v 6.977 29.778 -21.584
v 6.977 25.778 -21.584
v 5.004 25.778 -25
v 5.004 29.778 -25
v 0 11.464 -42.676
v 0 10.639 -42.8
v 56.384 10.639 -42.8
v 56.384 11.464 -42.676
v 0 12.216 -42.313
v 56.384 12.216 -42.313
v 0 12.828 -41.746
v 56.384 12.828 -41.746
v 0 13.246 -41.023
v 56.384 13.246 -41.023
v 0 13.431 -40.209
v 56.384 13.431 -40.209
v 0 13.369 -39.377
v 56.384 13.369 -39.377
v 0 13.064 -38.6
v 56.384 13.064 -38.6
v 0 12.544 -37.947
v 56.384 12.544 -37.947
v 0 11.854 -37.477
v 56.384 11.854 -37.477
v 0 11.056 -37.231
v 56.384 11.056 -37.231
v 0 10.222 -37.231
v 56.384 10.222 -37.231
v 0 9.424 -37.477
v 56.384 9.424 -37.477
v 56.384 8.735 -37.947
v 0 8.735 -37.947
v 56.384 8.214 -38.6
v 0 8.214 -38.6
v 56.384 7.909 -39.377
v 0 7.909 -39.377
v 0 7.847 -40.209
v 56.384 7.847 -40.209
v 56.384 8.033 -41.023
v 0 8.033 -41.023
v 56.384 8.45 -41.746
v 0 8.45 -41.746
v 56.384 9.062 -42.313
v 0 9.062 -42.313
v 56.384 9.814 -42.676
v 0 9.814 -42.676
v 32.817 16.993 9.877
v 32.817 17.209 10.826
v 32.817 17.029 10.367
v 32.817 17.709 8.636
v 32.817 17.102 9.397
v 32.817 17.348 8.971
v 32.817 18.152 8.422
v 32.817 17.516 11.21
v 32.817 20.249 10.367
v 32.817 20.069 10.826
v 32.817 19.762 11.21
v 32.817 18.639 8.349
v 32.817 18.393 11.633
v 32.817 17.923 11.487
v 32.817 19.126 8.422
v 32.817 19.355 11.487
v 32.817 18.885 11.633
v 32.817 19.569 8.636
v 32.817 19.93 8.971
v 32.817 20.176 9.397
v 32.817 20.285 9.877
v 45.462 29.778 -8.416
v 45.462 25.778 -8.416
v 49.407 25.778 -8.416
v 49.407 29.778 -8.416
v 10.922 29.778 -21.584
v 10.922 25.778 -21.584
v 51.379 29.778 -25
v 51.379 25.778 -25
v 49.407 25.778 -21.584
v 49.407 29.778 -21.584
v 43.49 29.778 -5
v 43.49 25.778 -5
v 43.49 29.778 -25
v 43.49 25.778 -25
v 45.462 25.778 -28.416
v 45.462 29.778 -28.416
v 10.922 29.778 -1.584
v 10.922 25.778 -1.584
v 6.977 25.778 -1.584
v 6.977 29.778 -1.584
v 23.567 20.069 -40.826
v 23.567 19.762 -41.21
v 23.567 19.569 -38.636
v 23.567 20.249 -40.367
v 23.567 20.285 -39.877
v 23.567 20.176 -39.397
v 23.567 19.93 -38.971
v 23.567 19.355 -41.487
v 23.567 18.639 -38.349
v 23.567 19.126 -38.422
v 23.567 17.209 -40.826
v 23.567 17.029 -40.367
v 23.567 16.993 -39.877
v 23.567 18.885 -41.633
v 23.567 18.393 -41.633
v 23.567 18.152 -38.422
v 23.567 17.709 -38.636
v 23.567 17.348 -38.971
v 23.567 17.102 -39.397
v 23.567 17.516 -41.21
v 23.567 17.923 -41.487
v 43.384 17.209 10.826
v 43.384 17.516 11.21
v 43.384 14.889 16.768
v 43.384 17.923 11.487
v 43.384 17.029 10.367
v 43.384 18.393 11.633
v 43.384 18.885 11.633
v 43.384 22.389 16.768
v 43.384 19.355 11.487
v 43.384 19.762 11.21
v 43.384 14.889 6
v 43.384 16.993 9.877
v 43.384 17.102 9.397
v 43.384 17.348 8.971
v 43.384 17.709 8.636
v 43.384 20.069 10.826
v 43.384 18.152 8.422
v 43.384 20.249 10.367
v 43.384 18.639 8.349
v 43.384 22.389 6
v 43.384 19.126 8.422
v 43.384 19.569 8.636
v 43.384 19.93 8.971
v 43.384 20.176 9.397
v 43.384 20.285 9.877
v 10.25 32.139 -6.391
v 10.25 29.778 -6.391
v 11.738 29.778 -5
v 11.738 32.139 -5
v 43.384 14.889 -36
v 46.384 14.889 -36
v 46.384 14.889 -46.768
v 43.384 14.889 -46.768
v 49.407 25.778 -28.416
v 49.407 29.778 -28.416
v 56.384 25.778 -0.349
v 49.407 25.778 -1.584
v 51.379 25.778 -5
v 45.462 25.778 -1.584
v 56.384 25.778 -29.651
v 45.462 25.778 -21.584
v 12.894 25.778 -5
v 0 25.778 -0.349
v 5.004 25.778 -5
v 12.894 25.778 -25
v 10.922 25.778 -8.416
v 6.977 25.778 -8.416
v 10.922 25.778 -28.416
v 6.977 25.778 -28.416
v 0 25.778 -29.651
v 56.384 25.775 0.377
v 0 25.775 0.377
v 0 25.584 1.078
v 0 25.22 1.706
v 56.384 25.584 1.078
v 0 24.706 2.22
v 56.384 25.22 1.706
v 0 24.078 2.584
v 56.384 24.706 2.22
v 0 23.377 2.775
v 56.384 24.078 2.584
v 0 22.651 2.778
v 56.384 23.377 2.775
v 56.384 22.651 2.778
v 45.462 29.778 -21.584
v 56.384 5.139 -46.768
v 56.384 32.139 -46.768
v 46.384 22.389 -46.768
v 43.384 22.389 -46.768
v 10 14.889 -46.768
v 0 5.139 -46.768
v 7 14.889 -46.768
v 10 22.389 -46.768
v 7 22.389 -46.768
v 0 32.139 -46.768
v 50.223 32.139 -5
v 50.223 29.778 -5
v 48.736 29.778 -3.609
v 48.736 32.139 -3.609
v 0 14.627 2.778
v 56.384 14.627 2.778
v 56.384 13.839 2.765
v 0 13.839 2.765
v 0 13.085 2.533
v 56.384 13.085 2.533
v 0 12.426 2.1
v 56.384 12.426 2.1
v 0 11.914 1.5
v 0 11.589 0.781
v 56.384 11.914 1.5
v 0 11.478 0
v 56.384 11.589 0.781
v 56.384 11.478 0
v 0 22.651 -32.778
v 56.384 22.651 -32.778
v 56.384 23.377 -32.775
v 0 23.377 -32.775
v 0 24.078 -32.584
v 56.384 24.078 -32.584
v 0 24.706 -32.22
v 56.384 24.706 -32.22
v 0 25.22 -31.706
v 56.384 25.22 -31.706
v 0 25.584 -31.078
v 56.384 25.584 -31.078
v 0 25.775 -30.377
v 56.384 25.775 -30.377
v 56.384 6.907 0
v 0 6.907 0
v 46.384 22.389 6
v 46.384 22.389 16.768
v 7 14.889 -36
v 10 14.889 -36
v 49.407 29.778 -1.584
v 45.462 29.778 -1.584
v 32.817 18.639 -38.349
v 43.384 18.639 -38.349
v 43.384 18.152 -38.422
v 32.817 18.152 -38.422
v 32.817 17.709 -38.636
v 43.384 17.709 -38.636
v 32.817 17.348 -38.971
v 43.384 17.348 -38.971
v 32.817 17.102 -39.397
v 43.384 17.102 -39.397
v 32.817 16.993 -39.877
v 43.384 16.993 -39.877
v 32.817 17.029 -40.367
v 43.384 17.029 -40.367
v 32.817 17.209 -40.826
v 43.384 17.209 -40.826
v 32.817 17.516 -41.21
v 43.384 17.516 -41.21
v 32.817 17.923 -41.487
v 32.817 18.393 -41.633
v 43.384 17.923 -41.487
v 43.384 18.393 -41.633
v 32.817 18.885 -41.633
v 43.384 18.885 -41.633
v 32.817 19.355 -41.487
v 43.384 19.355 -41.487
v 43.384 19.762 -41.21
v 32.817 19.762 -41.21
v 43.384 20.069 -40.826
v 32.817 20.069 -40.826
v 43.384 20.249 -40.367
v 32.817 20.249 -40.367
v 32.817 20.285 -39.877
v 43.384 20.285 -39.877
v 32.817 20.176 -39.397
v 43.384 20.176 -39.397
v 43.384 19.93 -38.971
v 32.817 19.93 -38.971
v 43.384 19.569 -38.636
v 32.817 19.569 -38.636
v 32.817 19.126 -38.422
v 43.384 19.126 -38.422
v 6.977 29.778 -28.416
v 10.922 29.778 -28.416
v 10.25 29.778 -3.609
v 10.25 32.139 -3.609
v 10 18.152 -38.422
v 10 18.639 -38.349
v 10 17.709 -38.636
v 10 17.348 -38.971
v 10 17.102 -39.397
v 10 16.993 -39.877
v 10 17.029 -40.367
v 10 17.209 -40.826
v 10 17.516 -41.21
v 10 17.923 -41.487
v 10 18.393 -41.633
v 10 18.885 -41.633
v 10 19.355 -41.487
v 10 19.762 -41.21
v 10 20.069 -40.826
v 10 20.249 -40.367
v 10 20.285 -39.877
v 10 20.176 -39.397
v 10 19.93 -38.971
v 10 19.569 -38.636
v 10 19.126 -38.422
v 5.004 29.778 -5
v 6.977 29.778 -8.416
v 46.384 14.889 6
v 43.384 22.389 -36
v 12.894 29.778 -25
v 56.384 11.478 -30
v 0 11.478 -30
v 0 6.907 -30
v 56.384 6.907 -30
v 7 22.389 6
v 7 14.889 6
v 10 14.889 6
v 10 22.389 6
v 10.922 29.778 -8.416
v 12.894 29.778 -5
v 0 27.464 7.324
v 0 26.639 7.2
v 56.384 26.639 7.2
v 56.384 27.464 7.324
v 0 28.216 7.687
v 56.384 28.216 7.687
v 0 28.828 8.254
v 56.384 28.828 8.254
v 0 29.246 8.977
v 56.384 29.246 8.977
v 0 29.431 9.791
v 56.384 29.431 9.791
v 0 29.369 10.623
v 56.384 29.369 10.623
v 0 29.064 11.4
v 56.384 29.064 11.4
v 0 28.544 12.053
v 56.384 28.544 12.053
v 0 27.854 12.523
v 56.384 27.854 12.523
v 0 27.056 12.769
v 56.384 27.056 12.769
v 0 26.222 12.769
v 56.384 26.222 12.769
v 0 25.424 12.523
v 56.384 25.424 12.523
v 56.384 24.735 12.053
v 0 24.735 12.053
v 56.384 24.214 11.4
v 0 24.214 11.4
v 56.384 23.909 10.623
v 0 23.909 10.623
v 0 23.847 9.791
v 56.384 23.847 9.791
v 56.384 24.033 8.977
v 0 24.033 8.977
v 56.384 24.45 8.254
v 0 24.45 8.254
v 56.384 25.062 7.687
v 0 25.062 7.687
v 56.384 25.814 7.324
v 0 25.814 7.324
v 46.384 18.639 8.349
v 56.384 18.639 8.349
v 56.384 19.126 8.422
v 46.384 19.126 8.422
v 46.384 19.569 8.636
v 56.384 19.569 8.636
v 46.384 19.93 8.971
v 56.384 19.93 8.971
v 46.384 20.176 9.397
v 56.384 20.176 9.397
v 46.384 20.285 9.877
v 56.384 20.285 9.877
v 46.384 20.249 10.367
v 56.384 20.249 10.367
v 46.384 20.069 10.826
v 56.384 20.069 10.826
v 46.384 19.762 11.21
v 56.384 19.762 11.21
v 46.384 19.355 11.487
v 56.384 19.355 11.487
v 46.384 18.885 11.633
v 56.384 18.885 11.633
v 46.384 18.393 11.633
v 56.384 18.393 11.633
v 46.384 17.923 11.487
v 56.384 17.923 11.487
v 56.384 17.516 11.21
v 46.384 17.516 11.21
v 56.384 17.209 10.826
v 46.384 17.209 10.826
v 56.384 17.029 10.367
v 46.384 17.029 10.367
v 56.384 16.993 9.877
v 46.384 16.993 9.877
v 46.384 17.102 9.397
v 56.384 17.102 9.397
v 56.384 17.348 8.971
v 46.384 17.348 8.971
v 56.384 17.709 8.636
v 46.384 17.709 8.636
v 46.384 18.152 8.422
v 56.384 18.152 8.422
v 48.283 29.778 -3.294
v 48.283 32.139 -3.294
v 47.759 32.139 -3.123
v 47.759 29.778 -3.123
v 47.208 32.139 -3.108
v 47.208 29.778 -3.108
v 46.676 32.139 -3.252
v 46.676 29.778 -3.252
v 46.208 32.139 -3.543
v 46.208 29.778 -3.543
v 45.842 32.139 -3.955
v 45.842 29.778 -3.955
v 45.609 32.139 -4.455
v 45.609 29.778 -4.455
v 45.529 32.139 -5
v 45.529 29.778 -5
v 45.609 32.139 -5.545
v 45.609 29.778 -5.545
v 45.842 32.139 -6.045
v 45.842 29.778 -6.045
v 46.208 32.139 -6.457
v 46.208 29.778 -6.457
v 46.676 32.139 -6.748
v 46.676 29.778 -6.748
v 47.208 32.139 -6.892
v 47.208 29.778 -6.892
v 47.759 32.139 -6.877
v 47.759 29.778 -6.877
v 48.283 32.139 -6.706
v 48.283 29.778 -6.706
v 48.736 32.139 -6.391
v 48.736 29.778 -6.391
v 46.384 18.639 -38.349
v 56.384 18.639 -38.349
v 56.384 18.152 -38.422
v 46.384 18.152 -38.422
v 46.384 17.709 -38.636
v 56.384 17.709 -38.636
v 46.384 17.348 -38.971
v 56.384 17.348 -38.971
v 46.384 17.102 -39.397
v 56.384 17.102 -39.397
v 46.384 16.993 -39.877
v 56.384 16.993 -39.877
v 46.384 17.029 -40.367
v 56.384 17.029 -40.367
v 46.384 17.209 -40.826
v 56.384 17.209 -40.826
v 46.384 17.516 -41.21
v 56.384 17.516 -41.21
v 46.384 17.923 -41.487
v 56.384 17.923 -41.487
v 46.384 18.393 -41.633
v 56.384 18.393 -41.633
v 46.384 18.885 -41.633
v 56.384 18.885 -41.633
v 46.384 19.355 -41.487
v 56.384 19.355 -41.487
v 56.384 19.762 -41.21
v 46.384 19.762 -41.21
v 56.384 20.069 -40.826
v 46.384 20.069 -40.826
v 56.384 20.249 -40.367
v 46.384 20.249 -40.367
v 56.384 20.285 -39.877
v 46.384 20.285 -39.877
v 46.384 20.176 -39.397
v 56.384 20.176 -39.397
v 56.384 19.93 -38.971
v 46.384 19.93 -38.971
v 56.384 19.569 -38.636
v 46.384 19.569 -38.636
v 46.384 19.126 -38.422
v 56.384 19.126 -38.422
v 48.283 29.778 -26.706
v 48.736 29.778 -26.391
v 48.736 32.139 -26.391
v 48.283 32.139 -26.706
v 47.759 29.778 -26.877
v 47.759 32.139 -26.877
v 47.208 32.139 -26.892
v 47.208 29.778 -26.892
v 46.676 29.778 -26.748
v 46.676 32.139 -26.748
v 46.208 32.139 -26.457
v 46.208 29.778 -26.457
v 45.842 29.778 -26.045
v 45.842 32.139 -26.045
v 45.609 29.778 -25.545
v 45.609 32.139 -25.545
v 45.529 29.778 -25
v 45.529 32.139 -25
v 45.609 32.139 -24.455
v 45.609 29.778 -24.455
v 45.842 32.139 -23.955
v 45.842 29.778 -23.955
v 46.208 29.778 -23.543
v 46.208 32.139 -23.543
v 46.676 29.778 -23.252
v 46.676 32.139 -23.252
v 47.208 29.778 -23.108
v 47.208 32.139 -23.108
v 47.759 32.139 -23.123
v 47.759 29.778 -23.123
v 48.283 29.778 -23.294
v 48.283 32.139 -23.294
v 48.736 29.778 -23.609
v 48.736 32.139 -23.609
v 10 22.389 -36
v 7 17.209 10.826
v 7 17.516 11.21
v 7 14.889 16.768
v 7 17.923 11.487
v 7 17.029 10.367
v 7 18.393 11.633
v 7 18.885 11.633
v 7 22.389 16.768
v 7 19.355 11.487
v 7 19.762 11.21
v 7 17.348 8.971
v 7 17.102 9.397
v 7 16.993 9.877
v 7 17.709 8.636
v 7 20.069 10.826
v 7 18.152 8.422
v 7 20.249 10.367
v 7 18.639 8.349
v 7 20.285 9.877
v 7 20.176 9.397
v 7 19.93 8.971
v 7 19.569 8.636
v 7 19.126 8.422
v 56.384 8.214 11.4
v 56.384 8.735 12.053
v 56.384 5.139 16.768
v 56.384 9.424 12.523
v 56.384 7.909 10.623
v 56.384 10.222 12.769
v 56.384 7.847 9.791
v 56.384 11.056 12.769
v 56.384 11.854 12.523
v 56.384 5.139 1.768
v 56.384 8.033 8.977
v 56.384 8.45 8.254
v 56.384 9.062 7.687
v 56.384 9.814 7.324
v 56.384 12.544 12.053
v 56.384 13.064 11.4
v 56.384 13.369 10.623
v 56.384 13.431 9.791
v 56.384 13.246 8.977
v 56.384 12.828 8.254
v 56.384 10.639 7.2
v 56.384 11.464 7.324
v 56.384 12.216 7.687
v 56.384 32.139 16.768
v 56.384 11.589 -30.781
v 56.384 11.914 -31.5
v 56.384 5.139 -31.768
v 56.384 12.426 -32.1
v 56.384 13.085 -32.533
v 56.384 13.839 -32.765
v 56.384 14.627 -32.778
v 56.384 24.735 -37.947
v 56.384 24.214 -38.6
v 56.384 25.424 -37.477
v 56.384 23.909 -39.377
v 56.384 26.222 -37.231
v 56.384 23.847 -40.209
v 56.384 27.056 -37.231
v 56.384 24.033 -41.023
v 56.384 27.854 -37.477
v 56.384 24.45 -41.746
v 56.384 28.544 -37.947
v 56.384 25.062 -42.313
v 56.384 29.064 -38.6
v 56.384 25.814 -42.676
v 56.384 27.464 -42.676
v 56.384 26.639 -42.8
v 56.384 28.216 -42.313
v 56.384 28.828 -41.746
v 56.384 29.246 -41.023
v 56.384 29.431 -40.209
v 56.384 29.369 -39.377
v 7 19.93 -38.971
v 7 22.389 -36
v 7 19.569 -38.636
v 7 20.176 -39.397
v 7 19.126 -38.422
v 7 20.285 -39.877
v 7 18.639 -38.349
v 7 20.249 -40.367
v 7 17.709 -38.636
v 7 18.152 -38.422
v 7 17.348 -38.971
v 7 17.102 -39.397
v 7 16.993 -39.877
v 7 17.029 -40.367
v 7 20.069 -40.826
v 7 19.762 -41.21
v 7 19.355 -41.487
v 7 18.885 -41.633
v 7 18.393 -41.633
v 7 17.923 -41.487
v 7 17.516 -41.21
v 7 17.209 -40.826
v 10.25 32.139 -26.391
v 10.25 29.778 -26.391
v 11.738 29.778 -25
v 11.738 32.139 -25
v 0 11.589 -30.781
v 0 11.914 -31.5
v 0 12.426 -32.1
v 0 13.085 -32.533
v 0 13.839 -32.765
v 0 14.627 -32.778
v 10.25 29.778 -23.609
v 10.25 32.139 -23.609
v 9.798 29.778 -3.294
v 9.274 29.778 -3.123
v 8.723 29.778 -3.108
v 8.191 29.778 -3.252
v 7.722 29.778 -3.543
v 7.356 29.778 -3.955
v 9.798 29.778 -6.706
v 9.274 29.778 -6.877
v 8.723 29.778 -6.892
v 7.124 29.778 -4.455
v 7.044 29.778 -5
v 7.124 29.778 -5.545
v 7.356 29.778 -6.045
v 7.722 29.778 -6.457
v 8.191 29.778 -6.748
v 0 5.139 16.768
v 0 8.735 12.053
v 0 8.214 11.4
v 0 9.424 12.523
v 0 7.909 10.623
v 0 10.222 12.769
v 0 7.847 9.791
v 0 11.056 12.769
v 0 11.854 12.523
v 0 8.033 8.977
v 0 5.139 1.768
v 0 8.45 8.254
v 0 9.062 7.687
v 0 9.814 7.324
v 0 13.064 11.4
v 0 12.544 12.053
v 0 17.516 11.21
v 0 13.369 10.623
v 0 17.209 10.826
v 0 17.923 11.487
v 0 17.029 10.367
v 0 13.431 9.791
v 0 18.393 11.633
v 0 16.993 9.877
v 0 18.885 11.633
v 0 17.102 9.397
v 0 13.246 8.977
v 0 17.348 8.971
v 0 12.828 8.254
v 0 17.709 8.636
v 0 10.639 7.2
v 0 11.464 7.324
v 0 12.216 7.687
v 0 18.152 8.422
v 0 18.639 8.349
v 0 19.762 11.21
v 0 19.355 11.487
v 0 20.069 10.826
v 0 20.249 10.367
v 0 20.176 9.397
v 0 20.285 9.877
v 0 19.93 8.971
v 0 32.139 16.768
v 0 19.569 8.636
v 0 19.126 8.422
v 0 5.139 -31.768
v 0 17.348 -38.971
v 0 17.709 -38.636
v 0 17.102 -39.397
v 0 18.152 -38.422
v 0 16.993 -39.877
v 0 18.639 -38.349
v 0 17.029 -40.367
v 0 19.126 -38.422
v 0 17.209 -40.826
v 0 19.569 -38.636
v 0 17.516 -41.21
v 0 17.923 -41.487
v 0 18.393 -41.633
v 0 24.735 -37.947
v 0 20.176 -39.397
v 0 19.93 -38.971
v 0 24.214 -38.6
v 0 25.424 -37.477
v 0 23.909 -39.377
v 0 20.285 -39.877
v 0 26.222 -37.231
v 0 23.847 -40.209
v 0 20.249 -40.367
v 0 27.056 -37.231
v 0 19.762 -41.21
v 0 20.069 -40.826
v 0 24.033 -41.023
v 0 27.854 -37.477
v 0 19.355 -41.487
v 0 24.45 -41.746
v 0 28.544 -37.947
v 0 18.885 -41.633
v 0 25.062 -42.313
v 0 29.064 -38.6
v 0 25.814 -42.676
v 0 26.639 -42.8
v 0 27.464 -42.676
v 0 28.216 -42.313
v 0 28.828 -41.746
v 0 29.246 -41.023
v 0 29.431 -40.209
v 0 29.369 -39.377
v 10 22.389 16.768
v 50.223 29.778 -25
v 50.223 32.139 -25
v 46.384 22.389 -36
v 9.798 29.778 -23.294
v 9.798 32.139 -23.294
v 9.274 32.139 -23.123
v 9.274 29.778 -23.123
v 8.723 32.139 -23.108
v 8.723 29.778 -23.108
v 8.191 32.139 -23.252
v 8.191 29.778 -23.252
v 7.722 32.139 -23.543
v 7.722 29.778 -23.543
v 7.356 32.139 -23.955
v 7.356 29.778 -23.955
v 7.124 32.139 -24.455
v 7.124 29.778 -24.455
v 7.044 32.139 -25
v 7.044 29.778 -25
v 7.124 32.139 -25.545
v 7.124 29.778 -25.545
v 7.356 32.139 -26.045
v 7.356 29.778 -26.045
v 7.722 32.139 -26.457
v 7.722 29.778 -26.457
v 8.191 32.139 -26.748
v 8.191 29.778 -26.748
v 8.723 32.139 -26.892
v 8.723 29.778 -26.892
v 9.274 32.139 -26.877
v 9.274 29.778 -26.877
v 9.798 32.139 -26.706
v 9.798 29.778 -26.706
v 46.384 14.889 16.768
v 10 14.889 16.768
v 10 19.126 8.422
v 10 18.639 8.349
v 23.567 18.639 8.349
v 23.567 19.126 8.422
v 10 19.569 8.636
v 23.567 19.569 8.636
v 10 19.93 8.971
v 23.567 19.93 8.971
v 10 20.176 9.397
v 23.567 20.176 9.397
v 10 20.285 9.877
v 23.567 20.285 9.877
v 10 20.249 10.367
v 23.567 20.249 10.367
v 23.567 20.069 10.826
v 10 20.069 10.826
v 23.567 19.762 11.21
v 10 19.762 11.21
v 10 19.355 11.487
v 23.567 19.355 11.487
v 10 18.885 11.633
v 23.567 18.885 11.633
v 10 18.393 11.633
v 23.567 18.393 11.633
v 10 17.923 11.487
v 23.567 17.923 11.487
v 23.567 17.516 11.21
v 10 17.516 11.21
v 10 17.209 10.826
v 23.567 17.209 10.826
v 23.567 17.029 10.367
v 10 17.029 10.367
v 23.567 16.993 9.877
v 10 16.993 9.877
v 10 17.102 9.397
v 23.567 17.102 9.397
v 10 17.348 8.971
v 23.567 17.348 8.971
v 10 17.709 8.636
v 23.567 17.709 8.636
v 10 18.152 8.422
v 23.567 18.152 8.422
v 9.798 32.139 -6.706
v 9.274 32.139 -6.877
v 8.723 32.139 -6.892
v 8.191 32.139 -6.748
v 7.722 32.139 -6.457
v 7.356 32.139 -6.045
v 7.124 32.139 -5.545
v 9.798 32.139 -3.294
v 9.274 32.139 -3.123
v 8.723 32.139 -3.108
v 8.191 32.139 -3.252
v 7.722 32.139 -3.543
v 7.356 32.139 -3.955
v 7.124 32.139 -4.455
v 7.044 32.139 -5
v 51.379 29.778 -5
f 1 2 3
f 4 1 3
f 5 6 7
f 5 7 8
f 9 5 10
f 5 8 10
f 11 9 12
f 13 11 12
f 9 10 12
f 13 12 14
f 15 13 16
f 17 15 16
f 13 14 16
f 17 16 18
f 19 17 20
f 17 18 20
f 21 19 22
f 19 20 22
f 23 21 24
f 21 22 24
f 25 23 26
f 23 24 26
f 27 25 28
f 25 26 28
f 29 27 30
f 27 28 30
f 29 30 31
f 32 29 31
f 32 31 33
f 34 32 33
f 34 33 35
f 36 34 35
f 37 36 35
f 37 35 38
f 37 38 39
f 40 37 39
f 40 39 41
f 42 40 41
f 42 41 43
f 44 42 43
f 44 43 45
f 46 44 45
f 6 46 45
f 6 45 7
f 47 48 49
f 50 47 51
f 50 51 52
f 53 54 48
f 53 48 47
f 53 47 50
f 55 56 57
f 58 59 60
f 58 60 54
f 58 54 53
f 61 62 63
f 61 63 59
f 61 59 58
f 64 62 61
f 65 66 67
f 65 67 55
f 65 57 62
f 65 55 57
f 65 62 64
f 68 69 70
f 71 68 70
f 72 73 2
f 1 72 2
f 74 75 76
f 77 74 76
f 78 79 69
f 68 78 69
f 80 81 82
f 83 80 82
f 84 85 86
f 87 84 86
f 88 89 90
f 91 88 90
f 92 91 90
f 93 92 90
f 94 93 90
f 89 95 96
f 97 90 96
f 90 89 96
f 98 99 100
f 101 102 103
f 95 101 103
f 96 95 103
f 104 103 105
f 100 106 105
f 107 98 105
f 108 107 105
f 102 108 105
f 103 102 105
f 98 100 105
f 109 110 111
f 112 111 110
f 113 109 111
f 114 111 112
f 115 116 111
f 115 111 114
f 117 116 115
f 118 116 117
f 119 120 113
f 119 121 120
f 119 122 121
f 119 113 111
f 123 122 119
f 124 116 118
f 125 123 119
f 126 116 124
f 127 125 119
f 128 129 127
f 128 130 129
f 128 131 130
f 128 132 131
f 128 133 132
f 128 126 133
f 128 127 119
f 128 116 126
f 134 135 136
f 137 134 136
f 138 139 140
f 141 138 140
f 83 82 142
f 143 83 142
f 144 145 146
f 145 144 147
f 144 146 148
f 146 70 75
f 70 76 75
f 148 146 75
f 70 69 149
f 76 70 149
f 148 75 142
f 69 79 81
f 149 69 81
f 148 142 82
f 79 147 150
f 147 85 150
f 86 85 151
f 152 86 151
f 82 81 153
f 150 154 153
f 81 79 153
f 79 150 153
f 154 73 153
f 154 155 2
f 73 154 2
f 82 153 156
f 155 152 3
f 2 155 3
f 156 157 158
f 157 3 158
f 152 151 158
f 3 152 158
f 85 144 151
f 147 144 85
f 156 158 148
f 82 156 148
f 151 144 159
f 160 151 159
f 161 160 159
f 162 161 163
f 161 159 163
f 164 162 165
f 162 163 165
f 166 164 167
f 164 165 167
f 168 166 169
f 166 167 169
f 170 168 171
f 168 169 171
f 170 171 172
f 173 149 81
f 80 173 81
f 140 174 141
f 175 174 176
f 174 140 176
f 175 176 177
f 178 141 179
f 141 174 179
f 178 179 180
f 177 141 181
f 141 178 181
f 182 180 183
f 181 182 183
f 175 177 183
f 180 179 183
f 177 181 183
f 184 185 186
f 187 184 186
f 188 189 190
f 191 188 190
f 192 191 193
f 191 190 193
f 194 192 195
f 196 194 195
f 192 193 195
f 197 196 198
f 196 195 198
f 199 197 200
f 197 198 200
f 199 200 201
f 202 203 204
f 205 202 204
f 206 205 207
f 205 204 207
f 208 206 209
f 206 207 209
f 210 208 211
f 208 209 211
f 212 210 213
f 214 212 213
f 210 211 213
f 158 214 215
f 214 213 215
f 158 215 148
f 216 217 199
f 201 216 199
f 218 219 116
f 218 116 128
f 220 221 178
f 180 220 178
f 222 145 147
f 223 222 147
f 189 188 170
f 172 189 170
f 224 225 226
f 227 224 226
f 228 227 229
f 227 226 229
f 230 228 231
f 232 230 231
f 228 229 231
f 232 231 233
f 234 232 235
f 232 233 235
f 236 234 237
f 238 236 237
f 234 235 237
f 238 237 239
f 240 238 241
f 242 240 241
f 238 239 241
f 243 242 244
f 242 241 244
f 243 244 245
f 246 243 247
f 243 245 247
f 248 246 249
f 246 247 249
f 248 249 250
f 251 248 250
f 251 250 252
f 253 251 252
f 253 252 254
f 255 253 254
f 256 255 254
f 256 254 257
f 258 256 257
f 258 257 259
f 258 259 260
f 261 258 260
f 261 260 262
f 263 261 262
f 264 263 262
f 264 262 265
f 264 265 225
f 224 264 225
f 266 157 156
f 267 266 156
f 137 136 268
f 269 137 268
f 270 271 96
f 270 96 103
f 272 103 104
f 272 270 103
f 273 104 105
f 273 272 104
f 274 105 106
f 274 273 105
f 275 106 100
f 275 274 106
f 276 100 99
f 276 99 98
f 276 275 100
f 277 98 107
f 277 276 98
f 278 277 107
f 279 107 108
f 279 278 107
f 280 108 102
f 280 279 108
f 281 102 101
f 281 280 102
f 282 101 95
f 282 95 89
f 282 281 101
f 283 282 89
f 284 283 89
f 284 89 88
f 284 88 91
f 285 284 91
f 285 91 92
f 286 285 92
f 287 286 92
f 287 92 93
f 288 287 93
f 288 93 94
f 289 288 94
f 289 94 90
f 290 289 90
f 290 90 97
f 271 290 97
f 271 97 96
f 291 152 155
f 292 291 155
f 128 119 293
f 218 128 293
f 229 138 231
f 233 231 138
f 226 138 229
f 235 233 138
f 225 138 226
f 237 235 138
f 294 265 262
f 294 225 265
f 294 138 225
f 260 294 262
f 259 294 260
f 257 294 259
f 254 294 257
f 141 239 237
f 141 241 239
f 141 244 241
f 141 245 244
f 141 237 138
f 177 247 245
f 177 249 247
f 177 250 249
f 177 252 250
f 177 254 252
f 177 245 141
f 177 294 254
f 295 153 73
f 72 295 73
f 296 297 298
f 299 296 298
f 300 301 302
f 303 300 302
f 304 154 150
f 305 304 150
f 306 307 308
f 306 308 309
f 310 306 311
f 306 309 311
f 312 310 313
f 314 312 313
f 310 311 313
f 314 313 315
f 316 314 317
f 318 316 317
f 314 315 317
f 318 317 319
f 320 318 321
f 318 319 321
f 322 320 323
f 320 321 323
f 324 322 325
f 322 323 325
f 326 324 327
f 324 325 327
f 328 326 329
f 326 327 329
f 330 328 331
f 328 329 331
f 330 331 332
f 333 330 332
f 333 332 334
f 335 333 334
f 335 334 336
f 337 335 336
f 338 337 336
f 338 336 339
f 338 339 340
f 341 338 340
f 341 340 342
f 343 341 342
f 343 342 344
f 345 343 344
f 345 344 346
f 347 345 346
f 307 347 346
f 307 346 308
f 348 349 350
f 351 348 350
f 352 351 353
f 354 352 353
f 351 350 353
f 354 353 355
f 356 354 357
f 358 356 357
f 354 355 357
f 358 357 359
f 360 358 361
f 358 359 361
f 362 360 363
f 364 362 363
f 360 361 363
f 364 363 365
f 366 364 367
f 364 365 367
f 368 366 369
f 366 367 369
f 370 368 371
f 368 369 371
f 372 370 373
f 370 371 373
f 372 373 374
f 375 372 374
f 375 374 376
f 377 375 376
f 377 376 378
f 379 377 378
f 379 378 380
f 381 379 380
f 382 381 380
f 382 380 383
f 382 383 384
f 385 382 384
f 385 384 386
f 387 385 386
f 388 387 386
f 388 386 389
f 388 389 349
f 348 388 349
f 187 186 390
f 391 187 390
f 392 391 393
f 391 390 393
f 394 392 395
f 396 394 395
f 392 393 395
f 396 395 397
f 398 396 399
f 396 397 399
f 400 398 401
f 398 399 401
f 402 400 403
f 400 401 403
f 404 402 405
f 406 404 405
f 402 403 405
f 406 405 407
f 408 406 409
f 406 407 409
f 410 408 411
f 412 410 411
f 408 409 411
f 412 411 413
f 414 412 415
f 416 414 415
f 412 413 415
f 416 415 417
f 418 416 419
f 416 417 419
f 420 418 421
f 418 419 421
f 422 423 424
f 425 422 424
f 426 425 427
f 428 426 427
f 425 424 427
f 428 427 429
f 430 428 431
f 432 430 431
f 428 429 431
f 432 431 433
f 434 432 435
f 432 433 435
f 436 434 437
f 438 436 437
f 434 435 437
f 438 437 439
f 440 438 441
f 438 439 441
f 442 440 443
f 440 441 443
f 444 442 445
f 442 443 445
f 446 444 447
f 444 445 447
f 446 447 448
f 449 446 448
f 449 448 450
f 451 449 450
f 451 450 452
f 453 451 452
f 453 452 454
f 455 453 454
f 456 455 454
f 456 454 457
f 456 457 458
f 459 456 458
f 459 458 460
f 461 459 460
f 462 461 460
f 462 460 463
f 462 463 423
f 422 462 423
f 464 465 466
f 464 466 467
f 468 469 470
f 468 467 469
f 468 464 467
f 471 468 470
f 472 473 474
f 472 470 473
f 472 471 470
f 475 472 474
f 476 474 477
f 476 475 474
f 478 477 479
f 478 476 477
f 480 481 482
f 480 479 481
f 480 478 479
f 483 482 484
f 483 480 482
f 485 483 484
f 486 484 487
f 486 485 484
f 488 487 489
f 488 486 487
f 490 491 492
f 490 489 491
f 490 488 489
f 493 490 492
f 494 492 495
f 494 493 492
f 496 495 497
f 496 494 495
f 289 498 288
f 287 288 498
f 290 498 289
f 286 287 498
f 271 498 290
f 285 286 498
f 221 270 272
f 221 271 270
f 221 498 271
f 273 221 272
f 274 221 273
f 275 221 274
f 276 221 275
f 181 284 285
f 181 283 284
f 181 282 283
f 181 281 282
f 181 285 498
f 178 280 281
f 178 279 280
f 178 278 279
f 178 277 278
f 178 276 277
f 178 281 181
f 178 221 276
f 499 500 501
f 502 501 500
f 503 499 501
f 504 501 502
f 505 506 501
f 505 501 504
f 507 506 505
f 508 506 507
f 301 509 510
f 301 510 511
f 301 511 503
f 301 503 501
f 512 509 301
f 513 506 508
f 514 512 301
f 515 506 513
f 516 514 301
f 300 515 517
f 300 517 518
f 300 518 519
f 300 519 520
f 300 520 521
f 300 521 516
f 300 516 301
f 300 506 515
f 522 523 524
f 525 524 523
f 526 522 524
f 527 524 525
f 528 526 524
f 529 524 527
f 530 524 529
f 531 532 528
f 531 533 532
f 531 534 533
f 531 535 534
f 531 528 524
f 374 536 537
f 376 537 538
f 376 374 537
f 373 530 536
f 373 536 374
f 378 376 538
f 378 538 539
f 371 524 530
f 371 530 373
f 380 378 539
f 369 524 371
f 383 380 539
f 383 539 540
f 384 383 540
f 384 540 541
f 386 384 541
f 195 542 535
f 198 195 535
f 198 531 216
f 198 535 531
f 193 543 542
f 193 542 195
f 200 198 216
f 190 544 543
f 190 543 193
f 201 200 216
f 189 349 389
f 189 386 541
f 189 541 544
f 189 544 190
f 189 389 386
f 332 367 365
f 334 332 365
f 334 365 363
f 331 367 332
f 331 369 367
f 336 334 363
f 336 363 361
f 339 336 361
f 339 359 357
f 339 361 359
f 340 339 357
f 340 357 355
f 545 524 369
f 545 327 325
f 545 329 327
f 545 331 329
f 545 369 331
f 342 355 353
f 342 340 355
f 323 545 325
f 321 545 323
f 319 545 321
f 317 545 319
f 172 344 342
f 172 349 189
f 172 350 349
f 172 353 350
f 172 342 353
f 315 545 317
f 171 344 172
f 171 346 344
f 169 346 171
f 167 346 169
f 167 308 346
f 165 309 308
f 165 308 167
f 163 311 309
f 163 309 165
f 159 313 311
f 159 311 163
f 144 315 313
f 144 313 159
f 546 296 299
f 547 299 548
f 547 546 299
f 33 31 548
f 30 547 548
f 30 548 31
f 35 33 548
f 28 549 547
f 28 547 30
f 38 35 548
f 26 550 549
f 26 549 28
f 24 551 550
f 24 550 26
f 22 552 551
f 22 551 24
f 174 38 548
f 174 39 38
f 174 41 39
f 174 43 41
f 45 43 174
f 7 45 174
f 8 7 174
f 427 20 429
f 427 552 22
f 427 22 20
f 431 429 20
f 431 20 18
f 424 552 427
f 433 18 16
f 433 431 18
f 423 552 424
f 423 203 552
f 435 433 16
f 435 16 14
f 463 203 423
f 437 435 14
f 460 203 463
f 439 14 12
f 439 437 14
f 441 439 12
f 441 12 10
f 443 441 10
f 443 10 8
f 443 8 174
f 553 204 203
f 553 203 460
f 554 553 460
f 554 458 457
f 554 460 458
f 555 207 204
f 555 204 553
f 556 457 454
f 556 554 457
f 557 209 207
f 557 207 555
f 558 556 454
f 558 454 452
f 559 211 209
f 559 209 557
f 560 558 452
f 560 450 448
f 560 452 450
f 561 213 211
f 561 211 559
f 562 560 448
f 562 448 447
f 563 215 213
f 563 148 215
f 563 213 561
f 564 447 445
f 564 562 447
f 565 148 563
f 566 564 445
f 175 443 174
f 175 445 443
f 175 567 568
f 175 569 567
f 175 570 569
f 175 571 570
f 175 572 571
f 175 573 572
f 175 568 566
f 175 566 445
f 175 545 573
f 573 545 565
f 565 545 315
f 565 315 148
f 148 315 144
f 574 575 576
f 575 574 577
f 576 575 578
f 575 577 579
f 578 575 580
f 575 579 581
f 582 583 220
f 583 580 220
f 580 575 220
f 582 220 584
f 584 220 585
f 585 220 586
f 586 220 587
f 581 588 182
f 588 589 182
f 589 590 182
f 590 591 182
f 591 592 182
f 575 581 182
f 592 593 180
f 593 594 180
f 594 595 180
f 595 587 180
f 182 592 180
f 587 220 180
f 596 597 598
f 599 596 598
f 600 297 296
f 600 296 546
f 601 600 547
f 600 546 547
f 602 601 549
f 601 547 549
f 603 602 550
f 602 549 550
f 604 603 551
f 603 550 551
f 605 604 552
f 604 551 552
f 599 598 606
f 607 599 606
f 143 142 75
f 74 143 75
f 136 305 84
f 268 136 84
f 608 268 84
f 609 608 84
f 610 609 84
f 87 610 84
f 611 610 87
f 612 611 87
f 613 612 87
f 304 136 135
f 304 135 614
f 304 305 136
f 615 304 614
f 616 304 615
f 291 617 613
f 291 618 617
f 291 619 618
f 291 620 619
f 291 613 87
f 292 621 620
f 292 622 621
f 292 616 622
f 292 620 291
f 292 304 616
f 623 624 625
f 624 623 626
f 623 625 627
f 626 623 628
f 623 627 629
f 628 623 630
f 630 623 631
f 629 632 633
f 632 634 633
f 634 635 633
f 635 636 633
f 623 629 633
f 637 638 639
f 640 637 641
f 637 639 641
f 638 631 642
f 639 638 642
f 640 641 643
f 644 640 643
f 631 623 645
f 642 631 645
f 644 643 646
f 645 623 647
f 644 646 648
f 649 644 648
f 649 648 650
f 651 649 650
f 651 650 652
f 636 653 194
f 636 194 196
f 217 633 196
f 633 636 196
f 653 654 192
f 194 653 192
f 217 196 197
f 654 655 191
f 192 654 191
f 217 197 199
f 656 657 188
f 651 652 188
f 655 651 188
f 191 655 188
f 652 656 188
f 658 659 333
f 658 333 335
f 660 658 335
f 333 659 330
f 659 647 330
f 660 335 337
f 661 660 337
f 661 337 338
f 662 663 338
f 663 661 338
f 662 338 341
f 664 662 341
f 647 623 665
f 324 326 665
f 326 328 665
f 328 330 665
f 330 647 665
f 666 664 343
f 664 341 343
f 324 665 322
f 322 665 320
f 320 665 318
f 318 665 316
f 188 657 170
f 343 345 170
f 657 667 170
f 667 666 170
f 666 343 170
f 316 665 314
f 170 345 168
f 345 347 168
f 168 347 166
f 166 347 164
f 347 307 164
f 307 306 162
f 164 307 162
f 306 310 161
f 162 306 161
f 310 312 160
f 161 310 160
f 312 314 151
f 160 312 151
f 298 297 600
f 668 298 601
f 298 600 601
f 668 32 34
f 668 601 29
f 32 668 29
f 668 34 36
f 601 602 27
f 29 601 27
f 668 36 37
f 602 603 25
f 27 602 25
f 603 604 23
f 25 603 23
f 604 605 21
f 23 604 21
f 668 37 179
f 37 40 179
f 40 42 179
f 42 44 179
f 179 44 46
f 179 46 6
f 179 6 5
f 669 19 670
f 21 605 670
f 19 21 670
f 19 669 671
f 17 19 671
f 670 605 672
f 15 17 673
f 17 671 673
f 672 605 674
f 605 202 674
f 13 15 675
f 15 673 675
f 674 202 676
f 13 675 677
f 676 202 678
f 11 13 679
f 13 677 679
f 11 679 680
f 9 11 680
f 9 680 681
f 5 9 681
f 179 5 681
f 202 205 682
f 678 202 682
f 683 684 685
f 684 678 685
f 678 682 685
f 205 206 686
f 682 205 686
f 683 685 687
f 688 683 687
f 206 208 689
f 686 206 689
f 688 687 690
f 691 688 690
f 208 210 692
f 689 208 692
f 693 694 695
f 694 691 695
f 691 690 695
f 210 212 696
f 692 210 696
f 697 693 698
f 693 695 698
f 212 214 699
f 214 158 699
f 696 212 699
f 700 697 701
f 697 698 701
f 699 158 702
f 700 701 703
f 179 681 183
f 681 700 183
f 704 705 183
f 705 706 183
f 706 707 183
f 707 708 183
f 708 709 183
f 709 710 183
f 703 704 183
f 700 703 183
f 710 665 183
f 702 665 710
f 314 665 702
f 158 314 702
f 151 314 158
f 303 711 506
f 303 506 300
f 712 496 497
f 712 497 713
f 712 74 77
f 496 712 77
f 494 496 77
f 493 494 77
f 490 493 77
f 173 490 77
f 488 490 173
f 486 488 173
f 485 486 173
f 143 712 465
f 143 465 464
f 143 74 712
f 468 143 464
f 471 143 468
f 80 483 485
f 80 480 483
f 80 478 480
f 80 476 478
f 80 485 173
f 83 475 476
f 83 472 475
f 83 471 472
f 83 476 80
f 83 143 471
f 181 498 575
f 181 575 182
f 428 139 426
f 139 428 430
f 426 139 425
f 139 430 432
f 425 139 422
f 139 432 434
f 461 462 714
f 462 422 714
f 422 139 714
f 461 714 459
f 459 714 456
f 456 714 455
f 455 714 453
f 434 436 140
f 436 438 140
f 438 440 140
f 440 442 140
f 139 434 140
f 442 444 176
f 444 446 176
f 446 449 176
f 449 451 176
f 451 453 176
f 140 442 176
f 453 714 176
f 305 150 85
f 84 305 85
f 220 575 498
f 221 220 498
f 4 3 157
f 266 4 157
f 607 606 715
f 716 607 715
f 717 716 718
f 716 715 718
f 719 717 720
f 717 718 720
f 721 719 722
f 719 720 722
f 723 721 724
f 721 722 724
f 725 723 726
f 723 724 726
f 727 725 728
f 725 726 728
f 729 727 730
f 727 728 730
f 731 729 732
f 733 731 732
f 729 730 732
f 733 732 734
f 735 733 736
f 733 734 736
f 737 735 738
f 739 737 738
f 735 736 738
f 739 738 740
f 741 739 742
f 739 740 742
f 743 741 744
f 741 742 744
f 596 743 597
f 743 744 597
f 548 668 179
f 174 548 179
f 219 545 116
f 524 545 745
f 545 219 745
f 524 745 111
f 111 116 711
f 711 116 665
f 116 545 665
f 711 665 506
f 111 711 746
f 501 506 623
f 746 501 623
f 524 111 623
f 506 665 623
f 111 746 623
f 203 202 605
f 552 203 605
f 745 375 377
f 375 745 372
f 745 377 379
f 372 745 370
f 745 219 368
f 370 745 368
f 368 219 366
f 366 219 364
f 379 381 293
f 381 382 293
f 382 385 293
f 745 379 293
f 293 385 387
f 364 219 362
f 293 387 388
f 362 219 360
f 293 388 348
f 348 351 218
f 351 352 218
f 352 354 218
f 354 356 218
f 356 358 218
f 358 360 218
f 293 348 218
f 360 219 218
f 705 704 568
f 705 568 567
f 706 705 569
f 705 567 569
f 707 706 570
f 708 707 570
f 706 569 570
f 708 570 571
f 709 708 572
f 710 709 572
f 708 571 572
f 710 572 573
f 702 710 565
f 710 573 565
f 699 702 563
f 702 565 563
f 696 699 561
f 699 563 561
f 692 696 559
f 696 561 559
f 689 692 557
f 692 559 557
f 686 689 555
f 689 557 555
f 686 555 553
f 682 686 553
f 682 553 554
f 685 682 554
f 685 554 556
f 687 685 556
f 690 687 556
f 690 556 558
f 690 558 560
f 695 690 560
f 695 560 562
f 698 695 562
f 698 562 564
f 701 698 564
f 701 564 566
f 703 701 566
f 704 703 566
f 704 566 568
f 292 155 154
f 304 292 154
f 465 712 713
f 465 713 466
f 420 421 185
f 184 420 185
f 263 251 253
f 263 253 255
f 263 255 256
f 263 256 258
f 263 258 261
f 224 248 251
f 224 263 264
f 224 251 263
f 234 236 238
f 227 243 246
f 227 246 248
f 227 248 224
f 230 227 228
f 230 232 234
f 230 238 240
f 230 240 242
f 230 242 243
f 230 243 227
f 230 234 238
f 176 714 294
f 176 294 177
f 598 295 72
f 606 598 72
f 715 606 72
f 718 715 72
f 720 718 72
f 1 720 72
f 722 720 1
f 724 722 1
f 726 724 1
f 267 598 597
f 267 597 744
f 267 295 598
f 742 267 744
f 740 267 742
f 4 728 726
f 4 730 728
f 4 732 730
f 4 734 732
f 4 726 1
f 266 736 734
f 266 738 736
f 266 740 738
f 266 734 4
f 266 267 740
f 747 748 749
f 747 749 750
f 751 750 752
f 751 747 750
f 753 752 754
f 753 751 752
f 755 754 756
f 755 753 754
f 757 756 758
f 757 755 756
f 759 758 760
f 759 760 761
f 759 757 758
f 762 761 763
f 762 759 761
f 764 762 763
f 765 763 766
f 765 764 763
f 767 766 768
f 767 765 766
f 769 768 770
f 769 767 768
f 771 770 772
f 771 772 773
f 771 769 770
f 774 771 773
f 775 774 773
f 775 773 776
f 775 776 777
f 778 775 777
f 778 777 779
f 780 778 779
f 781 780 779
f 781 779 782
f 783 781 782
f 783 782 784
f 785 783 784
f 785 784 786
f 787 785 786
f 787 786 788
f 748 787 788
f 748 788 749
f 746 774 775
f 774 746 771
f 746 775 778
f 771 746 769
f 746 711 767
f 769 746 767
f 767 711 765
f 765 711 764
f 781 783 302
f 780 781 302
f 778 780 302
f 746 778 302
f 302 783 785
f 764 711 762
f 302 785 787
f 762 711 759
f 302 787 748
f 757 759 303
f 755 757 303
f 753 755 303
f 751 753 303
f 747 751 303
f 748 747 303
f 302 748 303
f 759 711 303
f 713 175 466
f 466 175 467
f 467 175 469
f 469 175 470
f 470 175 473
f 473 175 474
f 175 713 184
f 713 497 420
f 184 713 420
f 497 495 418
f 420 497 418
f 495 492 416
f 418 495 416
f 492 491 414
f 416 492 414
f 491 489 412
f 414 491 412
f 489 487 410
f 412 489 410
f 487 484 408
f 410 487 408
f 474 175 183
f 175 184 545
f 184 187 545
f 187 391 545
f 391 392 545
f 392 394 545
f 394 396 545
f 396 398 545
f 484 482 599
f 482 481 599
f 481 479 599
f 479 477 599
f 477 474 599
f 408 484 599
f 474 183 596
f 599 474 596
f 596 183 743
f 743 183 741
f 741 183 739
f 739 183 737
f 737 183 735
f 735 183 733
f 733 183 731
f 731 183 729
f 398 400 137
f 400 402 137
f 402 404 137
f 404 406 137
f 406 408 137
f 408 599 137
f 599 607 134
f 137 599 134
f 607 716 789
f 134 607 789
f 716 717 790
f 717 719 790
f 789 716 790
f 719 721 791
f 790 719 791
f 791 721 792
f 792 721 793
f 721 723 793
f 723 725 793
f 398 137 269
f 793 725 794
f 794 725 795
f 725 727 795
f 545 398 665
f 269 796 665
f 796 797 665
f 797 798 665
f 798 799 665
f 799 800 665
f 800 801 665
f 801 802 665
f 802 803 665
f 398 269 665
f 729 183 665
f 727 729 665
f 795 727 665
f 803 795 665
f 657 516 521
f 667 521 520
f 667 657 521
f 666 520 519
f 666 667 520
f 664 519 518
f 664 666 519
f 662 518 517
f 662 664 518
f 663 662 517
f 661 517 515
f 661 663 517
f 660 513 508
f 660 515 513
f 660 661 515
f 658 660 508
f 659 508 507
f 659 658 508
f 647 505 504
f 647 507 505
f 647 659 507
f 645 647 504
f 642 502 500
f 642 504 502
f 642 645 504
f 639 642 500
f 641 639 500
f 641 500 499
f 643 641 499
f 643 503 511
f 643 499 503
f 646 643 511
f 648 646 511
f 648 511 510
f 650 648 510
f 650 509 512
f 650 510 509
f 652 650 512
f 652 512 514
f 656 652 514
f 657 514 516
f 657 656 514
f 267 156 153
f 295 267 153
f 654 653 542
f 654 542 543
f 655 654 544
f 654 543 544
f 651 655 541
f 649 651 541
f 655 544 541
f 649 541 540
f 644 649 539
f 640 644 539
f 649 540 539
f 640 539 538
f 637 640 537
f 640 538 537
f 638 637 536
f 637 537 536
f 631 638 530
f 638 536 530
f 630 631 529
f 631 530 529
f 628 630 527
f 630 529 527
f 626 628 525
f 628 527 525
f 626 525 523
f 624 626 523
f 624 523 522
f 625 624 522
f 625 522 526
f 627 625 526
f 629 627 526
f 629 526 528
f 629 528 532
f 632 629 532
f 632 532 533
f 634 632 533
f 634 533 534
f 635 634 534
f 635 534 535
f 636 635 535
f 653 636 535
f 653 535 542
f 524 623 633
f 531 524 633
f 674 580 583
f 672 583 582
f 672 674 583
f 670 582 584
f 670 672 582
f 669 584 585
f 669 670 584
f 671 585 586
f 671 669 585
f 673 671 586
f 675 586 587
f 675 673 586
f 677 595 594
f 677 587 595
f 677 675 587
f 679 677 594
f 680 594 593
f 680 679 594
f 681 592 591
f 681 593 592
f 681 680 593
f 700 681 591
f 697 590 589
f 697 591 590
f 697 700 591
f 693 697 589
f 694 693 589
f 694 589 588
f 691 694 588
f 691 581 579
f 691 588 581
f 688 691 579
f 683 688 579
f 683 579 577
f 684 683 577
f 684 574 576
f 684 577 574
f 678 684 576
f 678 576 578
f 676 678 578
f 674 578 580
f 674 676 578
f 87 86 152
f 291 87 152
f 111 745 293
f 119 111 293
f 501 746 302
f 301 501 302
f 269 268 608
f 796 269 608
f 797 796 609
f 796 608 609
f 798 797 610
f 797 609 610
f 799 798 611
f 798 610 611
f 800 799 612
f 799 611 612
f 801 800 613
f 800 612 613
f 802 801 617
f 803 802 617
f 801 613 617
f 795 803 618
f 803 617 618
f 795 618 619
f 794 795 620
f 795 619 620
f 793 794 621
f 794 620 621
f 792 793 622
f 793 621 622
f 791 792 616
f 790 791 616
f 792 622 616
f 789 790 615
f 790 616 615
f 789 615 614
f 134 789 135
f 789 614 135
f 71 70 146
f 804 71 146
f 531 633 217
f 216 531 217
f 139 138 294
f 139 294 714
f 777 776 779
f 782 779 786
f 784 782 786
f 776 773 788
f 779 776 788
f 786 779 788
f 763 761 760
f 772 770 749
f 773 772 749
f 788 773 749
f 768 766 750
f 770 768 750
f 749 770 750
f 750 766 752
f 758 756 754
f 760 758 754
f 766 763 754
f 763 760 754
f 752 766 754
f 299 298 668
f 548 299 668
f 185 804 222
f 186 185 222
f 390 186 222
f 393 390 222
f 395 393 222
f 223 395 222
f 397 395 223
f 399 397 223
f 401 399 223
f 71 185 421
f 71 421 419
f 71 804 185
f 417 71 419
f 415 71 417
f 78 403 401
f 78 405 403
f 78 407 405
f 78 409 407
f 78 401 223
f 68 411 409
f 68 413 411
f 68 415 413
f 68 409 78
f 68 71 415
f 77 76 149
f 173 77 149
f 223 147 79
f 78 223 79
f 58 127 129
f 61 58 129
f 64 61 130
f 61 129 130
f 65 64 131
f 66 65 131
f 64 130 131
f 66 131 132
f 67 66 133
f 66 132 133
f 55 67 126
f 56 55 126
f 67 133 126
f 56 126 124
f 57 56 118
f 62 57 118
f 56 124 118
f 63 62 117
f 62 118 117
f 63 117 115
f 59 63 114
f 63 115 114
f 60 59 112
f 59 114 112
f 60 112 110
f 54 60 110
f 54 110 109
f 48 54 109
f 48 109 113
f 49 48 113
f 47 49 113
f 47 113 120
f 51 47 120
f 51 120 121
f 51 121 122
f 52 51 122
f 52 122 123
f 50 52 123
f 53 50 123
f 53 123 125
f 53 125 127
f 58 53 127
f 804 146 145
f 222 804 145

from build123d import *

# Parameters (mm, degrees)
SKETCH2_R           = 2.778125
BOSS_EXTRUDE2_DEPTH = 56.3835756
SKETCH3_R           = 1.651
CUT_EXTRUDE1_DEPTH  = 23.5668
SKETCH4_W           = 10.767766953
SKETCH4_H           = 3
CUT_EXTRUDE2_DEPTH  = 3.75
SKETCH5_R           = 2.8
CUT_EXTRUDE3_DEPTH  = 80.995318373
CUT_EXTRUDE4_DEPTH  = 77.107177875
CUT_EXTRUDE5_DEPTH  = 4


with BuildPart() as part:
    # Sketch2 → Boss-Extrude2 (new body)
    with BuildSketch(Plane(origin=(0, 0, 0), x_dir=(0, 0, -1), z_dir=(1, 0, 0))):
        with BuildLine():
            Line((0, 25.778125), (30, 25.778125))
            ThreePointArc((30, 25.778125), (31.964431026, 24.964431026), (32.778125, 23))
            Line((32.778125, 23), (32.778125, 14.278125))
            ThreePointArc((32.778125, 14.278125), (31.964431026, 12.313693974), (30, 11.5))
            Line((30, 11.5), (30, 6.906829453))
            Line((30, 6.906829453), (31.767766953, 5.1390625))
            Line((31.767766953, 5.1390625), (46.767766953, 5.1390625))
            Line((46.767766953, 5.1390625), (46.767766953, 32.1390625))
            Line((46.767766953, 32.1390625), (-16.767766953, 32.1390625))
            Line((-16.767766953, 32.1390625), (-16.767766953, 5.1390625))
            Line((-16.767766953, 5.1390625), (-1.767766953, 5.1390625))
            Line((-1.767766953, 5.1390625), (0, 6.906829453))
            Line((0, 6.906829453), (0, 11.5))
            ThreePointArc((0, 11.5), (-1.964431026, 12.313693974), (-2.778125, 14.278125))
            Line((-2.778125, 14.278125), (-2.778125, 23))
            ThreePointArc((-2.778125, 23), (-1.964431026, 24.964431026), (0, 25.778125))
        make_face()
        with Locations((-10, 26.6390625)):
            Circle(SKETCH2_R, mode=Mode.SUBTRACT)
        with Locations((-10, 10.6390625)):
            Circle(SKETCH2_R, mode=Mode.SUBTRACT)
        with Locations((40, 10.6390625)):
            Circle(SKETCH2_R, mode=Mode.SUBTRACT)
        with Locations((40, 26.6390625)):
            Circle(SKETCH2_R, mode=Mode.SUBTRACT)
    extrude(amount=BOSS_EXTRUDE2_DEPTH)

    # Sketch3 → Cut-Extrude1 (cut)
    with BuildSketch(Plane(origin=(56.3835756, 0, 0), x_dir=(0, 0, -1), z_dir=(1, 0, 0))):
        with Locations((-10, 18.6390625)):
            Circle(SKETCH3_R)
        with Locations((40, 18.6390625)):
            Circle(SKETCH3_R)
    cut_extrude1 = extrude(amount=-CUT_EXTRUDE1_DEPTH, mode=Mode.SUBTRACT)

    # Sketch4 → Cut-Extrude2 (cut, symmetric)
    with BuildSketch(Plane(origin=(0, 18.6390625, 0), x_dir=(0, 0, -1), z_dir=(0, -1, 0))):
        with Locations((-11.383883477, 44.8835756)):
            Rectangle(SKETCH4_W, SKETCH4_H)
        with Locations((41.383883477, 44.8835756)):
            Rectangle(SKETCH4_W, SKETCH4_H)
        with Locations((-11.383883477, 8.5)):
            Rectangle(SKETCH4_W, SKETCH4_H)
        with Locations((41.383883477, 8.5)):
            Rectangle(SKETCH4_W, SKETCH4_H)
    extrude(amount=CUT_EXTRUDE2_DEPTH, both=True, mode=Mode.SUBTRACT)

    # Sketch5 → Cut-Extrude3 (cut, through all)
    with BuildSketch(Plane(origin=(56.3835756, 0, 0), x_dir=(0, 0, -1), z_dir=(1, 0, 0))):
        with Locations((-10, 26.6390625)):
            Circle(SKETCH5_R)
        with Locations((0, 23)):
            Circle(SKETCH5_R)
        with Locations((-10, 10.6390625)):
            Circle(SKETCH5_R)
        with Locations((40, 26.6390625)):
            Circle(SKETCH5_R)
        with Locations((40, 10.6390625)):
            Circle(SKETCH5_R)
        with Locations((30, 23)):
            Circle(SKETCH5_R)
        with Locations((0, 14.278125)):
            Circle(SKETCH5_R)
        with Locations((30, 14.278125)):
            Circle(SKETCH5_R)
    extrude(amount=-CUT_EXTRUDE3_DEPTH, mode=Mode.SUBTRACT)

    # Mirror1: Cut-Extrude1 across plane
    add(cut_extrude1.mirror(Plane.ZY.offset(-28.1917878)), mode=Mode.SUBTRACT)

    # Sketch6 → Cut-Extrude4 (cut, through all)
    with BuildSketch(Plane.XZ.offset(-25.778125)):
        with BuildLine():
            Line((11.737987423, -5), (10.250411309, -3.608694115))
            ThreePointArc((10.250411309, -3.608694115), (7.044145412, -5), (10.250411309, -6.391305885))
            Line((10.250411309, -6.391305885), (11.737987423, -5))
        make_face()
        with BuildLine():
            Line((50.223272198, -5), (48.735696084, -3.608694115))
            ThreePointArc((48.735696084, -3.608694115), (45.529430188, -5), (48.735696084, -6.391305885))
            Line((48.735696084, -6.391305885), (50.223272198, -5))
        make_face()
        with BuildLine():
            Line((50.223272198, -25), (48.735696084, -26.391305885))
            ThreePointArc((48.735696084, -26.391305885), (45.529430188, -25), (48.735696084, -23.608694115))
            Line((48.735696084, -23.608694115), (50.223272198, -25))
        make_face()
        with BuildLine():
            Line((11.737987423, -25), (10.250411309, -23.608694115))
            ThreePointArc((10.250411309, -23.608694115), (7.044145412, -25), (10.250411309, -26.391305885))
            Line((10.250411309, -26.391305885), (11.737987423, -25))
        make_face()
    extrude(amount=-CUT_EXTRUDE4_DEPTH, mode=Mode.SUBTRACT)

    # Sketch7 → Cut-Extrude5 (cut)
    with BuildSketch(Plane(origin=(0, 25.778125, 0), x_dir=(-1, 0, 0), z_dir=(0, -1, 0))):
        Polygon((-10.921547137, 28.4163), (-12.893948862, 25), (-10.921547137, 21.5837), (-6.976743688, 21.5837), (-5.004341963, 25), (-6.976743688, 28.4163), align=None)
        Polygon((-10.921547137, 8.4163), (-12.893948862, 5), (-10.921547137, 1.5837), (-6.976743688, 1.5837), (-5.004341963, 5), (-6.976743688, 8.4163), align=None)
        Polygon((-45.462028463, 8.4163), (-49.406831912, 8.4163), (-51.379233637, 5), (-49.406831912, 1.5837), (-45.462028463, 1.5837), (-43.489626738, 5), align=None)
        Polygon((-45.462028463, 28.4163), (-49.406831912, 28.4163), (-51.379233637, 25), (-49.406831912, 21.5837), (-45.462028463, 21.5837), (-43.489626738, 25), align=None)
    extrude(amount=-CUT_EXTRUDE5_DEPTH, mode=Mode.SUBTRACT)


solid = part.part
